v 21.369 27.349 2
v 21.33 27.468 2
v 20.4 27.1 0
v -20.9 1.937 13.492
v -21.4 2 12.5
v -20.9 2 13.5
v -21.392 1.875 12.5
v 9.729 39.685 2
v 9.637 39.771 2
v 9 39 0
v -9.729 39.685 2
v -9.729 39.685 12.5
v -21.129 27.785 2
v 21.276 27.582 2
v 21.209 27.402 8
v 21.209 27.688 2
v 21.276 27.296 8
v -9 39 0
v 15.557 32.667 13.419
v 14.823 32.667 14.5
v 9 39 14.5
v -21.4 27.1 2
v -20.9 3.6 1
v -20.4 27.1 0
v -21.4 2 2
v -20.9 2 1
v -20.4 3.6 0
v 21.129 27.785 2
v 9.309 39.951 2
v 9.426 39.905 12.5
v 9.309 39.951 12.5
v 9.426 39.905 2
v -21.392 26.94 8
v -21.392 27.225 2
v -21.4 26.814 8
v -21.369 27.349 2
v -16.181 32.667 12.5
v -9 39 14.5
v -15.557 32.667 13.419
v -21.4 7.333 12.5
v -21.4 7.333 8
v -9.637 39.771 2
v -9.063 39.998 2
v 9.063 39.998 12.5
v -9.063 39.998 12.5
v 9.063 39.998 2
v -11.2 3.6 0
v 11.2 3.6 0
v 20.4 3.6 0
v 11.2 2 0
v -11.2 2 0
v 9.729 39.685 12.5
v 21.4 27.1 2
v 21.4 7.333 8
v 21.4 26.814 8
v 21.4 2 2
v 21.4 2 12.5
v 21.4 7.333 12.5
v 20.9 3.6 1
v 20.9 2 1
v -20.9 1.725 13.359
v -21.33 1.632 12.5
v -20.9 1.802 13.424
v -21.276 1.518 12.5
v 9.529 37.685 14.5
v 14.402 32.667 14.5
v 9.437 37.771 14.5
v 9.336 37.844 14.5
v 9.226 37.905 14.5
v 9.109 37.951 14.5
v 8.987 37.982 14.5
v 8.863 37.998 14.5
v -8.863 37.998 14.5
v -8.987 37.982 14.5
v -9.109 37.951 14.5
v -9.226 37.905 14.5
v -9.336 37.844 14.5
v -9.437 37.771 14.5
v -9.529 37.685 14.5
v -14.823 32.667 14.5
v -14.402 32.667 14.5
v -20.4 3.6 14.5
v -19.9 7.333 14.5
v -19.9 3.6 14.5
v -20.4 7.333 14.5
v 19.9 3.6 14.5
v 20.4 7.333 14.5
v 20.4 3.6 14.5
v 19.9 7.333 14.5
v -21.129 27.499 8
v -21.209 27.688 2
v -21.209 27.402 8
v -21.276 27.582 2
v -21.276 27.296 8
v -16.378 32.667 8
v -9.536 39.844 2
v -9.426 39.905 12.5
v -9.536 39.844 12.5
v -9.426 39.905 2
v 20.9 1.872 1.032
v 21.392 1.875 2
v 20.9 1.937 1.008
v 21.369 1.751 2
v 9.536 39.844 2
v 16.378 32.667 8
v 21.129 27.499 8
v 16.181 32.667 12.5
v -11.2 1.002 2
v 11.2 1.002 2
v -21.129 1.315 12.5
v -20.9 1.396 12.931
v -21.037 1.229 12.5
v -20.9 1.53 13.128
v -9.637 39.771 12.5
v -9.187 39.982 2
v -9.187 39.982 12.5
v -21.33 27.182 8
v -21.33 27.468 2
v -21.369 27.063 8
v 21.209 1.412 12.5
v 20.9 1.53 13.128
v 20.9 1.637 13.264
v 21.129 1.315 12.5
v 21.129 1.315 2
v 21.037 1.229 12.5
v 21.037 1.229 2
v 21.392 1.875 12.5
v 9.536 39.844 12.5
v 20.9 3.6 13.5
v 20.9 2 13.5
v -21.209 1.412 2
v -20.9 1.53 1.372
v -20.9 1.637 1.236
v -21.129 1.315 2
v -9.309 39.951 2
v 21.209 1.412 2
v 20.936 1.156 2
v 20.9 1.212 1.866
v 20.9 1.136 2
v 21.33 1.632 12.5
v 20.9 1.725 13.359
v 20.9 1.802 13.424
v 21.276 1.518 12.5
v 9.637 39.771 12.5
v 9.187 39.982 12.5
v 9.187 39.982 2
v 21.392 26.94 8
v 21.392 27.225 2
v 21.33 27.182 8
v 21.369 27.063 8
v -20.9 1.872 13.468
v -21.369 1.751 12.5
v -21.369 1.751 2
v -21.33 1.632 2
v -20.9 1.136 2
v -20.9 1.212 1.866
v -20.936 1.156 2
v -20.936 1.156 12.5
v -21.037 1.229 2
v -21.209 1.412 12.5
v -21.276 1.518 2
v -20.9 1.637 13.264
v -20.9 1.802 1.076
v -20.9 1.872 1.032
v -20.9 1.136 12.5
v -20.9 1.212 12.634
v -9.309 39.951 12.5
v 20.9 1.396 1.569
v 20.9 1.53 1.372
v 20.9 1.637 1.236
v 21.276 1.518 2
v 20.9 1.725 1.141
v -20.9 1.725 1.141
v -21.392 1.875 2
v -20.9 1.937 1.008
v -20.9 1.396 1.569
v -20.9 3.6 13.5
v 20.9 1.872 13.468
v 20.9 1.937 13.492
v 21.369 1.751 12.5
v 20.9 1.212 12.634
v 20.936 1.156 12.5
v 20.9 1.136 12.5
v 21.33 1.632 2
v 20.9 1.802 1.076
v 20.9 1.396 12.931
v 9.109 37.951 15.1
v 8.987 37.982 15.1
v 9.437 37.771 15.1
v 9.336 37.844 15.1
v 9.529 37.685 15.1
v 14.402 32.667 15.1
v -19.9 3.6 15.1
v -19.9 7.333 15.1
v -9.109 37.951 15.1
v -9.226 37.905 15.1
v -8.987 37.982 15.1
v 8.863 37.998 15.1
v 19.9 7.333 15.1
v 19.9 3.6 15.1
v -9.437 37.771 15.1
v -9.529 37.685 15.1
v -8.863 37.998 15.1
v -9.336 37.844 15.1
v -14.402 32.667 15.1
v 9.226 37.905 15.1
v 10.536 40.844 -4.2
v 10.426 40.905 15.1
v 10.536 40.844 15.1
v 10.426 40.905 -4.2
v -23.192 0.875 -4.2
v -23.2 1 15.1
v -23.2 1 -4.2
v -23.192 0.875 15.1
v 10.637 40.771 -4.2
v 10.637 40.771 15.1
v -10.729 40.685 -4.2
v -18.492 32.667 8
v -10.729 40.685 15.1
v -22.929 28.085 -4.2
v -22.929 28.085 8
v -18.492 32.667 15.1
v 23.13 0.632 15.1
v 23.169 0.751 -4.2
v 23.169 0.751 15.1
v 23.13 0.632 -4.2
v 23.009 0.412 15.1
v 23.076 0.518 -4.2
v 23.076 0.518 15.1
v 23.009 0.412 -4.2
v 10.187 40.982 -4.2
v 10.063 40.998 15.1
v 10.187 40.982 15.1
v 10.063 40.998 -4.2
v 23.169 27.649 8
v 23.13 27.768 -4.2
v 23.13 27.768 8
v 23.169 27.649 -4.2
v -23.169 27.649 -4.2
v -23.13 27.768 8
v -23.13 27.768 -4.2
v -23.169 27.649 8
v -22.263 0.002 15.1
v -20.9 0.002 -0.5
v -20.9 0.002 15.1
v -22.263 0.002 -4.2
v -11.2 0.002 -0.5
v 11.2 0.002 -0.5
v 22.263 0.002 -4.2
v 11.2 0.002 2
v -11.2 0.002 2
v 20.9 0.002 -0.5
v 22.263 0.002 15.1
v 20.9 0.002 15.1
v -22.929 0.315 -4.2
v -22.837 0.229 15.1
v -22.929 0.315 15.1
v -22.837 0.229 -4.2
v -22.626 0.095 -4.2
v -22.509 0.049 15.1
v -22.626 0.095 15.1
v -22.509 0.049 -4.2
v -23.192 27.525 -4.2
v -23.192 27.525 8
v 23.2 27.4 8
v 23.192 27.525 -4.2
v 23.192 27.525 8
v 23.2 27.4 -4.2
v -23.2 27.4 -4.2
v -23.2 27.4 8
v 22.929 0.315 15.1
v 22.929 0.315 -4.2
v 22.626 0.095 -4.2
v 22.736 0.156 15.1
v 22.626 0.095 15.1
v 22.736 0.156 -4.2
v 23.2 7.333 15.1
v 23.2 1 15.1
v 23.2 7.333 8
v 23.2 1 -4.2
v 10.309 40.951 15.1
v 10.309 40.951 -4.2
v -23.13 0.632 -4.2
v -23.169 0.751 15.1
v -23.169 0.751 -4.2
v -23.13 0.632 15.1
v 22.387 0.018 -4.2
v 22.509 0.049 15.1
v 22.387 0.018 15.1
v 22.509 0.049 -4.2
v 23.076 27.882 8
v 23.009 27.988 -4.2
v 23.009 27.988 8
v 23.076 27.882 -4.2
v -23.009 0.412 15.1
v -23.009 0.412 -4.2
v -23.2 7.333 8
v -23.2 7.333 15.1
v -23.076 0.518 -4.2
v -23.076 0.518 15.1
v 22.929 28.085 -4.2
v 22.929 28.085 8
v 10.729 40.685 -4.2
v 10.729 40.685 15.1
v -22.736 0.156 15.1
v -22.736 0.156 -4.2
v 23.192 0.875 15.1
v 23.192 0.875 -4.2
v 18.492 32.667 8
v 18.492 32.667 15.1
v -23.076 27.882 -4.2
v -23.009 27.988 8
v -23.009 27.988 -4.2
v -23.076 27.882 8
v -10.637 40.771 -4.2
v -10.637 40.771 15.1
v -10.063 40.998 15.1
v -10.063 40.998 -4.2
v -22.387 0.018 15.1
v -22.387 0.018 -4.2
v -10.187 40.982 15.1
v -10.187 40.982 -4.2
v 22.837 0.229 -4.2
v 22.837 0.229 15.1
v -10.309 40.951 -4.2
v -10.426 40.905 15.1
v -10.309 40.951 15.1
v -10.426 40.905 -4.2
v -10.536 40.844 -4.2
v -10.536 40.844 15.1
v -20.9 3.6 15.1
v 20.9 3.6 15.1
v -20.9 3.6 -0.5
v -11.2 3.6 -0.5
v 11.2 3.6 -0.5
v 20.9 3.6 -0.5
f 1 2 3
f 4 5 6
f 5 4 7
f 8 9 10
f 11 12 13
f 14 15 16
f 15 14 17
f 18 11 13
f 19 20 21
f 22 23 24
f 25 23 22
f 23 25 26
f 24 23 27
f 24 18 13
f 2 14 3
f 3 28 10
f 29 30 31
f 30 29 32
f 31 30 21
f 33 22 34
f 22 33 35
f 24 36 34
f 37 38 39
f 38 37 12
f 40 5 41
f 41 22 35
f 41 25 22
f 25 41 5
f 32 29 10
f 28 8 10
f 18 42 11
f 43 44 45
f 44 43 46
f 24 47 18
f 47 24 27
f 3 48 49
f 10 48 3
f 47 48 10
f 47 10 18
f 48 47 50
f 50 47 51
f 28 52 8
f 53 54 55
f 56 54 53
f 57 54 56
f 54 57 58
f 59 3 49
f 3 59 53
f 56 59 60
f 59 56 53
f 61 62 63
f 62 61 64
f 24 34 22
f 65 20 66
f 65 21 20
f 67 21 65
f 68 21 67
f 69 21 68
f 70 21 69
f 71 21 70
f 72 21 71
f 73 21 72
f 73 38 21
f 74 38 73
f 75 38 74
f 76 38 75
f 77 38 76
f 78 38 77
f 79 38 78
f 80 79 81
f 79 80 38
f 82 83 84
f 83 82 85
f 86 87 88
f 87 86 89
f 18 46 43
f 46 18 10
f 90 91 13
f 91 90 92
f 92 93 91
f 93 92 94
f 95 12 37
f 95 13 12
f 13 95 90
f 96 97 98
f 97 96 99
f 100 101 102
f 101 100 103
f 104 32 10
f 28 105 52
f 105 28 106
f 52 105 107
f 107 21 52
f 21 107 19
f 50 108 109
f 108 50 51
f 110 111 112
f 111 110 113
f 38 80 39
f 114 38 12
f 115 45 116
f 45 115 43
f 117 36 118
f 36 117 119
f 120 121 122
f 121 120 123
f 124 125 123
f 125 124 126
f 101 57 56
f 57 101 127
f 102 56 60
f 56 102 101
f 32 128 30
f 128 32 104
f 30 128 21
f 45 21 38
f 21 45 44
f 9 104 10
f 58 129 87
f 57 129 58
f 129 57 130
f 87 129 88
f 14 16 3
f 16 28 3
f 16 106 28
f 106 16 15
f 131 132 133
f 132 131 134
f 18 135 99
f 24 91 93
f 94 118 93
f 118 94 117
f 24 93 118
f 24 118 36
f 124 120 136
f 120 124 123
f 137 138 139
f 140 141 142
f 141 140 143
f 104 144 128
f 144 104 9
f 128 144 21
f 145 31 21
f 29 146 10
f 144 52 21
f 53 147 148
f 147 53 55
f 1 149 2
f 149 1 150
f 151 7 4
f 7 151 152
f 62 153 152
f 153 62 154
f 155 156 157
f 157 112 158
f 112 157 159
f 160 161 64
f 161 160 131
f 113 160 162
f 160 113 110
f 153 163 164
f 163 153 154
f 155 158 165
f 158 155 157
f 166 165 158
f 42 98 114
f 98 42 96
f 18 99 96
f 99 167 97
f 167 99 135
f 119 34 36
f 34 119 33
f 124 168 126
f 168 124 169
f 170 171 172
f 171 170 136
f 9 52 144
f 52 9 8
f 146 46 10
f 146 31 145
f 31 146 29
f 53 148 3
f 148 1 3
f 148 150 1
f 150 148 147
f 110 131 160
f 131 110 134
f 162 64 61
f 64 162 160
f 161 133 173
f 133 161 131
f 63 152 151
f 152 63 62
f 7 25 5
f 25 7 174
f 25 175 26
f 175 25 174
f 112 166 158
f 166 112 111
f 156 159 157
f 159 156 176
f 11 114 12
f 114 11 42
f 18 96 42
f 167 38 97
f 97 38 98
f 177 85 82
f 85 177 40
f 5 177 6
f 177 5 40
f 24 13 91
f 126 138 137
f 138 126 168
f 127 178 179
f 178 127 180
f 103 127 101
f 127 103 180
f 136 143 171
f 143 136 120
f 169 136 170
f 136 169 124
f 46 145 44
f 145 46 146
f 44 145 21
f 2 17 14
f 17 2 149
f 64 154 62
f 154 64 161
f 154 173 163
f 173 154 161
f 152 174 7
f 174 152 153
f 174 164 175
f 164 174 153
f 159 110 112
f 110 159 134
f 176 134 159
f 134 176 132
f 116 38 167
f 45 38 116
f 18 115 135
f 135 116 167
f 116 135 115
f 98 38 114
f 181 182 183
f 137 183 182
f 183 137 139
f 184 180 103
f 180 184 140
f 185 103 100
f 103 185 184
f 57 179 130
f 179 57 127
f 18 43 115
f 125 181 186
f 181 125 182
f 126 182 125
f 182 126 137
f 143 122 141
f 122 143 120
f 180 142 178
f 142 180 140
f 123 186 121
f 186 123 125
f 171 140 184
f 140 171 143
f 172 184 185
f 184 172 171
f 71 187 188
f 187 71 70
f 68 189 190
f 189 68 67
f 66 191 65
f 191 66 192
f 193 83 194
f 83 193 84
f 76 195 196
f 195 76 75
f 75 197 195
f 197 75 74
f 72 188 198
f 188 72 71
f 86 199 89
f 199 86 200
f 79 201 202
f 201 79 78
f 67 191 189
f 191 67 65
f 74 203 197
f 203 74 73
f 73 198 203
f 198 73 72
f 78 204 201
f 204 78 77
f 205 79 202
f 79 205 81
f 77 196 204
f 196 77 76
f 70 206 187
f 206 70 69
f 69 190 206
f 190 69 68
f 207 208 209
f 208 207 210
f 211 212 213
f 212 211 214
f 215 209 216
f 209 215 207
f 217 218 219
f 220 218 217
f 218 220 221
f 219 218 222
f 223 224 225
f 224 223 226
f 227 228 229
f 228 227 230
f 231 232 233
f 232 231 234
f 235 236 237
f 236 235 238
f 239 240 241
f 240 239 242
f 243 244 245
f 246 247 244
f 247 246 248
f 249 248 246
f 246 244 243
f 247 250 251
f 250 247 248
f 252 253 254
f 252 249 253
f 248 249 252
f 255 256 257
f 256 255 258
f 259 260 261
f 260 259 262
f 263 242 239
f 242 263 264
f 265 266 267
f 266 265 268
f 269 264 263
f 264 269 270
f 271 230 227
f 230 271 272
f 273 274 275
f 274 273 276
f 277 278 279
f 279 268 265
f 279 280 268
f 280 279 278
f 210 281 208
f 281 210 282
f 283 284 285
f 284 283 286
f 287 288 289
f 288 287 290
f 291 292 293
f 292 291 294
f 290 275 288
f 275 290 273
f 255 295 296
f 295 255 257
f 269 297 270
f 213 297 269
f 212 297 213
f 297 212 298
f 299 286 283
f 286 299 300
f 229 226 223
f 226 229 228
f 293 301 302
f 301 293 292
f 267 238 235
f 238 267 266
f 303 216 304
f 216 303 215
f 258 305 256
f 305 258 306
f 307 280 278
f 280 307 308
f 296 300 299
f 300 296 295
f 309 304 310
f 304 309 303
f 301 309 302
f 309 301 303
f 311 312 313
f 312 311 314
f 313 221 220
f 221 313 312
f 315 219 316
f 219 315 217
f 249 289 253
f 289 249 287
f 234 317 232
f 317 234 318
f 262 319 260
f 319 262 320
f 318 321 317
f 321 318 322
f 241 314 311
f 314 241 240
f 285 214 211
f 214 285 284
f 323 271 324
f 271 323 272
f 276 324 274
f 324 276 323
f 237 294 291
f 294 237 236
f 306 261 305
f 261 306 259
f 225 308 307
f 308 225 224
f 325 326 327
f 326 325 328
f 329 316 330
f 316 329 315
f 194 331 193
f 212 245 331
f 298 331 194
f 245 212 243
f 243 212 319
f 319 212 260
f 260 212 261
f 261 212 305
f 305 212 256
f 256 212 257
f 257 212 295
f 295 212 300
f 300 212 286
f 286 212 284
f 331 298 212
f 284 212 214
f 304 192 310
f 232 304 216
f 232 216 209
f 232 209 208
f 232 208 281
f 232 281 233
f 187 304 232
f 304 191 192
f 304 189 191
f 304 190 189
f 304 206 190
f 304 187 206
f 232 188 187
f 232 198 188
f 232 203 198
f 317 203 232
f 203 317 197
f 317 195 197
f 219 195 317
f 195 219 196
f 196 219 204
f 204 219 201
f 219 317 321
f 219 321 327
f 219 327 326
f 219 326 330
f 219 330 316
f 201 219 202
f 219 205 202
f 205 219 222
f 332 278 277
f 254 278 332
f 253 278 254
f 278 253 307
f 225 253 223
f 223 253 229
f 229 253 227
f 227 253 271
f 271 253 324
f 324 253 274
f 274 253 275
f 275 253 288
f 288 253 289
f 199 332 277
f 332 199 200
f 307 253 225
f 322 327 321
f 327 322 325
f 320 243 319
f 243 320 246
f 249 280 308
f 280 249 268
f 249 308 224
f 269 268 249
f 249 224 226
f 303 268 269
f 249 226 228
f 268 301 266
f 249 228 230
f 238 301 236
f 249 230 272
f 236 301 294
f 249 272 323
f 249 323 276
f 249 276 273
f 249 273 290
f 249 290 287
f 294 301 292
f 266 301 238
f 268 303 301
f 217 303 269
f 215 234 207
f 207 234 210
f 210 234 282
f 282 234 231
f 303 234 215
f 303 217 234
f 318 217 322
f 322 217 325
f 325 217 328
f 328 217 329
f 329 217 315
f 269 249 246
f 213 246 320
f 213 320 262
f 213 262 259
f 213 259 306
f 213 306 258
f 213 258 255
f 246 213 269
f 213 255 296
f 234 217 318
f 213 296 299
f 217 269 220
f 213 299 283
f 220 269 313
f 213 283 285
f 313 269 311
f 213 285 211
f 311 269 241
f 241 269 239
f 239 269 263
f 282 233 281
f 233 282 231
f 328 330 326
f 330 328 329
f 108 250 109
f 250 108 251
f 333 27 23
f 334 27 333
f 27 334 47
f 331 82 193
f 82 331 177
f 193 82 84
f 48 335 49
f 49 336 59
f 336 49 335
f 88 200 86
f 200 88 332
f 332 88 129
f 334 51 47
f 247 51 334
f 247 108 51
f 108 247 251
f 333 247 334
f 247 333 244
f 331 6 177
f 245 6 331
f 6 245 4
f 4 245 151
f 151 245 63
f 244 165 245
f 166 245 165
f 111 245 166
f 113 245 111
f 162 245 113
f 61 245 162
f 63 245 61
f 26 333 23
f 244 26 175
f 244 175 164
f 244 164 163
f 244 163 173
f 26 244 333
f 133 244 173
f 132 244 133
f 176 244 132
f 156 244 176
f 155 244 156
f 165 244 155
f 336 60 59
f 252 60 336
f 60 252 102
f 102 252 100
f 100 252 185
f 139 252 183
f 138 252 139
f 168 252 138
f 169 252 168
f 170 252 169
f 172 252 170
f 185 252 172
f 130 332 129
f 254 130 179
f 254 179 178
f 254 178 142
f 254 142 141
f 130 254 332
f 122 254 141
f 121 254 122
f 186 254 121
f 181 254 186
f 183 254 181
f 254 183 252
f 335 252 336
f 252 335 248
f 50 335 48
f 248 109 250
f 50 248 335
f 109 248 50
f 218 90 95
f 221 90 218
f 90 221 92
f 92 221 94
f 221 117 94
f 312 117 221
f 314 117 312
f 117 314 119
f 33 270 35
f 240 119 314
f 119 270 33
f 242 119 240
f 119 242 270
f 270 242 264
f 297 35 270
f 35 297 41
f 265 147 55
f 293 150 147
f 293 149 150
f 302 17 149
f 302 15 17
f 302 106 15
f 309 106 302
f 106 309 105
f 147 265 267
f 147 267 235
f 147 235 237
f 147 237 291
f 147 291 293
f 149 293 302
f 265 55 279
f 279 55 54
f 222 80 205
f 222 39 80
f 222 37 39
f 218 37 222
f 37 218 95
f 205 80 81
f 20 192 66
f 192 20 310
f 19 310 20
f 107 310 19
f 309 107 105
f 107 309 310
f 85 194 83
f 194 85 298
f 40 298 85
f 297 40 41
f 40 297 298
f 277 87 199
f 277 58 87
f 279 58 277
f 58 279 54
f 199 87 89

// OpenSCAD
module ShellyRGBW2(
   _inner=false,
   drillholes=false,
   bt=1.8,
   shellyX=42.8,
   shellyY=38.0,
   shellyTopW=20, 
   shellyThick=14.5,
   shellyPinFieldX=36
){

   if (!_inner){
      difference(){
         union(){
            difference(){
               hull(){
                  translate([(shellyX/2+0.8),1,shellyThick/2-bt]) 
                     cylinder(h=shellyThick+bt+3,r=1,center=true,$fn=50);
                  translate([(shellyX/2+0.8)*-1,1,shellyThick/2-bt]) 
                     cylinder(h=shellyThick+bt+3,r=1,center=true,$fn=50);
                  translate([(shellyTopW/2),shellyY+2,shellyThick/2-bt]) 
                     cylinder(h=shellyThick+bt+3,r=1,center=true,$fn=50);
                  translate([(shellyTopW/2)*-1,shellyY+2,shellyThick/2-bt]) 
                     cylinder(h=shellyThick+bt+3,r=1,center=true,$fn=50);
        
                  translate([(shellyTopW/2+0.8)+(shellyX-shellyTopW)/2,
                              shellyY-(shellyX-shellyTopW)/2+0.8,shellyThick/2-bt]) 
                     cylinder(h=shellyThick+bt+3,r1=1,center=true,$fn=50);
                  translate([((shellyTopW/2+0.8)+(shellyX-shellyTopW)/2)*-1,
                             shellyY-(shellyX-shellyTopW)/2+0.8,shellyThick/2-bt]) 
                     cylinder(h=shellyThick+bt+3,r1=1,center=true,$fn=50);
               }
               translate([(shellyX/4+1)*-1,0,2])
                  cube([shellyX/2+2,bt*2,shellyThick]);
               translate([(shellyX/2-1)*-1-0.5,0,-0.5])
                  cube([shellyX/4-1,bt*2,shellyThick+3]);
               translate([(shellyX/4)+0.5,0,-0.5])
                  cube([shellyX/4-1,bt*2,shellyThick+3]);
        
               translate([0,shellyY/2+1,12])
                  cube([shellyX+8,shellyY/1.5,8],center=true);
        
               ShellyRGBW2(bt=bt,_inner=true);
            }
            if (drillholes){
               hull(){
                  translate([shellyX/2+shellyY/6+1,shellyY/2,bt*-1])
                      cylinder(h=bt,r=shellyY/6,center=true,$fn=50);
                  translate([(shellyX/2+shellyY/6+1)*-1,shellyY/2,bt*-1])
                      cylinder(h=bt,r=shellyY/6,center=true,$fn=50);
               }
            }
         }
         if (drillholes){
            translate([(shellyX/2+shellyY/6+1),shellyY/2,bt*-1])
                cylinder(h=bt,d=4.5,center=true,$fn=50);
            translate([(shellyX/2+shellyY/6+1),shellyY/2,bt/1.4*-1])
                cylinder(h=bt/2,d1=4.5,d2=6,center=true,$fn=50);
            translate([(shellyX/2+shellyY/6+1)*-1,shellyY/2,bt*-1])
                cylinder(h=bt,d=4.5,center=true,$fn=50);
            translate([(shellyX/2+shellyY/6+1)*-1,shellyY/2,bt/1.4*-1])
                cylinder(h=bt/2,d1=4.5,d2=6,center=true,$fn=50);
         }
      }

   }
   else{
      union(){
         hull(){
            //rechts
            translate([(shellyX/2-1),2,shellyThick-1]) 
               cylinder(h=2,r1=1,r2=0,center=true,$fn=50);
            translate([(shellyX/2-1),2,1]) 
               cylinder(h=2,r1=0,r2=1,center=true,$fn=50);
        
            //links
            translate([(shellyX/2-1)*-1,2,shellyThick-1]) 
               cylinder(h=2,r1=1,r2=0,center=true,$fn=50);
            translate([(shellyX/2-1)*-1,2,1]) 
               cylinder(h=2,r1=0,r2=1,center=true,$fn=50);
        
            //oben rechts
            translate([(shellyTopW/2-1),shellyY+1,shellyThick-1]) 
               cylinder(h=2,r1=1,r2=0,center=true,$fn=50);
            translate([(shellyTopW/2-1),shellyY+1,1]) 
               cylinder(h=2,r1=0,r2=1,center=true,$fn=50);
        
            //oben links
            translate([(shellyTopW/2-1)*-1,shellyY+1,shellyThick-1]) 
               cylinder(h=2,r1=1,r2=0,center=true,$fn=50);
            translate([(shellyTopW/2-1)*-1,shellyY+1,1]) 
               cylinder(h=2,r1=0,r2=1,center=true,$fn=50);
        
        
            //mitte rechts
            translate([(shellyTopW/2-1)+(shellyX-shellyTopW)/2,
                        shellyY-(shellyX-shellyTopW)/2,shellyThick-1]) 
               cylinder(h=2,r1=1,r2=0,center=true,$fn=50);
            translate([(shellyTopW/2-1)+(shellyX-shellyTopW)/2,
                        shellyY-(shellyX-shellyTopW)/2+0.5,1]) 
               cylinder(h=2,r1=0,r2=1,center=true,$fn=50);
        
            //mitte links
            translate([((shellyTopW/2-1)+(shellyX-shellyTopW)/2)*-1,
                       shellyY-(shellyX-shellyTopW)/2,shellyThick-1]) 
               cylinder(h=2,r1=1,r2=0,center=true,$fn=50);
            translate([((shellyTopW/2-1)+(shellyX-shellyTopW)/2)*-1,
                        shellyY-(shellyX-shellyTopW)/2+0.5,1]) 
               cylinder(h=2,r1=0,r2=1,center=true,$fn=50);
        
         }

         hull(){
            translate([(shellyX/2-2.5),1,shellyThick]) 
               cylinder(h=shellyThick+bt+3,r=1,center=true,$fn=50);
            translate([(shellyX/2-2.5)*-1,1,shellyThick]) 
               cylinder(h=shellyThick+bt+3,r=1,center=true,$fn=50);
            translate([(shellyTopW/2)-1.2,shellyY-1,shellyThick]) 
               cylinder(h=shellyThick+bt+3,r=1,center=true,$fn=50);
            translate([(shellyTopW/2-1.2)*-1,shellyY-1,shellyThick]) 
               cylinder(h=shellyThick+bt+3,r=1,center=true,$fn=50);
        
            translate([(shellyTopW/2-2.5)+(shellyX-shellyTopW)/2,
                        shellyY-(shellyX-shellyTopW)/2,shellyThick]) 
               cylinder(h=shellyThick+bt+3,r1=1,center=true,$fn=50);
            translate([((shellyTopW/2-2.5)+(shellyX-shellyTopW)/2)*-1,
                       shellyY-(shellyX-shellyTopW)/2,shellyThick]) 
               cylinder(h=shellyThick+bt+3,r1=1,center=true,$fn=50);
         }
       }
   }


}

ShellyRGBW2();
